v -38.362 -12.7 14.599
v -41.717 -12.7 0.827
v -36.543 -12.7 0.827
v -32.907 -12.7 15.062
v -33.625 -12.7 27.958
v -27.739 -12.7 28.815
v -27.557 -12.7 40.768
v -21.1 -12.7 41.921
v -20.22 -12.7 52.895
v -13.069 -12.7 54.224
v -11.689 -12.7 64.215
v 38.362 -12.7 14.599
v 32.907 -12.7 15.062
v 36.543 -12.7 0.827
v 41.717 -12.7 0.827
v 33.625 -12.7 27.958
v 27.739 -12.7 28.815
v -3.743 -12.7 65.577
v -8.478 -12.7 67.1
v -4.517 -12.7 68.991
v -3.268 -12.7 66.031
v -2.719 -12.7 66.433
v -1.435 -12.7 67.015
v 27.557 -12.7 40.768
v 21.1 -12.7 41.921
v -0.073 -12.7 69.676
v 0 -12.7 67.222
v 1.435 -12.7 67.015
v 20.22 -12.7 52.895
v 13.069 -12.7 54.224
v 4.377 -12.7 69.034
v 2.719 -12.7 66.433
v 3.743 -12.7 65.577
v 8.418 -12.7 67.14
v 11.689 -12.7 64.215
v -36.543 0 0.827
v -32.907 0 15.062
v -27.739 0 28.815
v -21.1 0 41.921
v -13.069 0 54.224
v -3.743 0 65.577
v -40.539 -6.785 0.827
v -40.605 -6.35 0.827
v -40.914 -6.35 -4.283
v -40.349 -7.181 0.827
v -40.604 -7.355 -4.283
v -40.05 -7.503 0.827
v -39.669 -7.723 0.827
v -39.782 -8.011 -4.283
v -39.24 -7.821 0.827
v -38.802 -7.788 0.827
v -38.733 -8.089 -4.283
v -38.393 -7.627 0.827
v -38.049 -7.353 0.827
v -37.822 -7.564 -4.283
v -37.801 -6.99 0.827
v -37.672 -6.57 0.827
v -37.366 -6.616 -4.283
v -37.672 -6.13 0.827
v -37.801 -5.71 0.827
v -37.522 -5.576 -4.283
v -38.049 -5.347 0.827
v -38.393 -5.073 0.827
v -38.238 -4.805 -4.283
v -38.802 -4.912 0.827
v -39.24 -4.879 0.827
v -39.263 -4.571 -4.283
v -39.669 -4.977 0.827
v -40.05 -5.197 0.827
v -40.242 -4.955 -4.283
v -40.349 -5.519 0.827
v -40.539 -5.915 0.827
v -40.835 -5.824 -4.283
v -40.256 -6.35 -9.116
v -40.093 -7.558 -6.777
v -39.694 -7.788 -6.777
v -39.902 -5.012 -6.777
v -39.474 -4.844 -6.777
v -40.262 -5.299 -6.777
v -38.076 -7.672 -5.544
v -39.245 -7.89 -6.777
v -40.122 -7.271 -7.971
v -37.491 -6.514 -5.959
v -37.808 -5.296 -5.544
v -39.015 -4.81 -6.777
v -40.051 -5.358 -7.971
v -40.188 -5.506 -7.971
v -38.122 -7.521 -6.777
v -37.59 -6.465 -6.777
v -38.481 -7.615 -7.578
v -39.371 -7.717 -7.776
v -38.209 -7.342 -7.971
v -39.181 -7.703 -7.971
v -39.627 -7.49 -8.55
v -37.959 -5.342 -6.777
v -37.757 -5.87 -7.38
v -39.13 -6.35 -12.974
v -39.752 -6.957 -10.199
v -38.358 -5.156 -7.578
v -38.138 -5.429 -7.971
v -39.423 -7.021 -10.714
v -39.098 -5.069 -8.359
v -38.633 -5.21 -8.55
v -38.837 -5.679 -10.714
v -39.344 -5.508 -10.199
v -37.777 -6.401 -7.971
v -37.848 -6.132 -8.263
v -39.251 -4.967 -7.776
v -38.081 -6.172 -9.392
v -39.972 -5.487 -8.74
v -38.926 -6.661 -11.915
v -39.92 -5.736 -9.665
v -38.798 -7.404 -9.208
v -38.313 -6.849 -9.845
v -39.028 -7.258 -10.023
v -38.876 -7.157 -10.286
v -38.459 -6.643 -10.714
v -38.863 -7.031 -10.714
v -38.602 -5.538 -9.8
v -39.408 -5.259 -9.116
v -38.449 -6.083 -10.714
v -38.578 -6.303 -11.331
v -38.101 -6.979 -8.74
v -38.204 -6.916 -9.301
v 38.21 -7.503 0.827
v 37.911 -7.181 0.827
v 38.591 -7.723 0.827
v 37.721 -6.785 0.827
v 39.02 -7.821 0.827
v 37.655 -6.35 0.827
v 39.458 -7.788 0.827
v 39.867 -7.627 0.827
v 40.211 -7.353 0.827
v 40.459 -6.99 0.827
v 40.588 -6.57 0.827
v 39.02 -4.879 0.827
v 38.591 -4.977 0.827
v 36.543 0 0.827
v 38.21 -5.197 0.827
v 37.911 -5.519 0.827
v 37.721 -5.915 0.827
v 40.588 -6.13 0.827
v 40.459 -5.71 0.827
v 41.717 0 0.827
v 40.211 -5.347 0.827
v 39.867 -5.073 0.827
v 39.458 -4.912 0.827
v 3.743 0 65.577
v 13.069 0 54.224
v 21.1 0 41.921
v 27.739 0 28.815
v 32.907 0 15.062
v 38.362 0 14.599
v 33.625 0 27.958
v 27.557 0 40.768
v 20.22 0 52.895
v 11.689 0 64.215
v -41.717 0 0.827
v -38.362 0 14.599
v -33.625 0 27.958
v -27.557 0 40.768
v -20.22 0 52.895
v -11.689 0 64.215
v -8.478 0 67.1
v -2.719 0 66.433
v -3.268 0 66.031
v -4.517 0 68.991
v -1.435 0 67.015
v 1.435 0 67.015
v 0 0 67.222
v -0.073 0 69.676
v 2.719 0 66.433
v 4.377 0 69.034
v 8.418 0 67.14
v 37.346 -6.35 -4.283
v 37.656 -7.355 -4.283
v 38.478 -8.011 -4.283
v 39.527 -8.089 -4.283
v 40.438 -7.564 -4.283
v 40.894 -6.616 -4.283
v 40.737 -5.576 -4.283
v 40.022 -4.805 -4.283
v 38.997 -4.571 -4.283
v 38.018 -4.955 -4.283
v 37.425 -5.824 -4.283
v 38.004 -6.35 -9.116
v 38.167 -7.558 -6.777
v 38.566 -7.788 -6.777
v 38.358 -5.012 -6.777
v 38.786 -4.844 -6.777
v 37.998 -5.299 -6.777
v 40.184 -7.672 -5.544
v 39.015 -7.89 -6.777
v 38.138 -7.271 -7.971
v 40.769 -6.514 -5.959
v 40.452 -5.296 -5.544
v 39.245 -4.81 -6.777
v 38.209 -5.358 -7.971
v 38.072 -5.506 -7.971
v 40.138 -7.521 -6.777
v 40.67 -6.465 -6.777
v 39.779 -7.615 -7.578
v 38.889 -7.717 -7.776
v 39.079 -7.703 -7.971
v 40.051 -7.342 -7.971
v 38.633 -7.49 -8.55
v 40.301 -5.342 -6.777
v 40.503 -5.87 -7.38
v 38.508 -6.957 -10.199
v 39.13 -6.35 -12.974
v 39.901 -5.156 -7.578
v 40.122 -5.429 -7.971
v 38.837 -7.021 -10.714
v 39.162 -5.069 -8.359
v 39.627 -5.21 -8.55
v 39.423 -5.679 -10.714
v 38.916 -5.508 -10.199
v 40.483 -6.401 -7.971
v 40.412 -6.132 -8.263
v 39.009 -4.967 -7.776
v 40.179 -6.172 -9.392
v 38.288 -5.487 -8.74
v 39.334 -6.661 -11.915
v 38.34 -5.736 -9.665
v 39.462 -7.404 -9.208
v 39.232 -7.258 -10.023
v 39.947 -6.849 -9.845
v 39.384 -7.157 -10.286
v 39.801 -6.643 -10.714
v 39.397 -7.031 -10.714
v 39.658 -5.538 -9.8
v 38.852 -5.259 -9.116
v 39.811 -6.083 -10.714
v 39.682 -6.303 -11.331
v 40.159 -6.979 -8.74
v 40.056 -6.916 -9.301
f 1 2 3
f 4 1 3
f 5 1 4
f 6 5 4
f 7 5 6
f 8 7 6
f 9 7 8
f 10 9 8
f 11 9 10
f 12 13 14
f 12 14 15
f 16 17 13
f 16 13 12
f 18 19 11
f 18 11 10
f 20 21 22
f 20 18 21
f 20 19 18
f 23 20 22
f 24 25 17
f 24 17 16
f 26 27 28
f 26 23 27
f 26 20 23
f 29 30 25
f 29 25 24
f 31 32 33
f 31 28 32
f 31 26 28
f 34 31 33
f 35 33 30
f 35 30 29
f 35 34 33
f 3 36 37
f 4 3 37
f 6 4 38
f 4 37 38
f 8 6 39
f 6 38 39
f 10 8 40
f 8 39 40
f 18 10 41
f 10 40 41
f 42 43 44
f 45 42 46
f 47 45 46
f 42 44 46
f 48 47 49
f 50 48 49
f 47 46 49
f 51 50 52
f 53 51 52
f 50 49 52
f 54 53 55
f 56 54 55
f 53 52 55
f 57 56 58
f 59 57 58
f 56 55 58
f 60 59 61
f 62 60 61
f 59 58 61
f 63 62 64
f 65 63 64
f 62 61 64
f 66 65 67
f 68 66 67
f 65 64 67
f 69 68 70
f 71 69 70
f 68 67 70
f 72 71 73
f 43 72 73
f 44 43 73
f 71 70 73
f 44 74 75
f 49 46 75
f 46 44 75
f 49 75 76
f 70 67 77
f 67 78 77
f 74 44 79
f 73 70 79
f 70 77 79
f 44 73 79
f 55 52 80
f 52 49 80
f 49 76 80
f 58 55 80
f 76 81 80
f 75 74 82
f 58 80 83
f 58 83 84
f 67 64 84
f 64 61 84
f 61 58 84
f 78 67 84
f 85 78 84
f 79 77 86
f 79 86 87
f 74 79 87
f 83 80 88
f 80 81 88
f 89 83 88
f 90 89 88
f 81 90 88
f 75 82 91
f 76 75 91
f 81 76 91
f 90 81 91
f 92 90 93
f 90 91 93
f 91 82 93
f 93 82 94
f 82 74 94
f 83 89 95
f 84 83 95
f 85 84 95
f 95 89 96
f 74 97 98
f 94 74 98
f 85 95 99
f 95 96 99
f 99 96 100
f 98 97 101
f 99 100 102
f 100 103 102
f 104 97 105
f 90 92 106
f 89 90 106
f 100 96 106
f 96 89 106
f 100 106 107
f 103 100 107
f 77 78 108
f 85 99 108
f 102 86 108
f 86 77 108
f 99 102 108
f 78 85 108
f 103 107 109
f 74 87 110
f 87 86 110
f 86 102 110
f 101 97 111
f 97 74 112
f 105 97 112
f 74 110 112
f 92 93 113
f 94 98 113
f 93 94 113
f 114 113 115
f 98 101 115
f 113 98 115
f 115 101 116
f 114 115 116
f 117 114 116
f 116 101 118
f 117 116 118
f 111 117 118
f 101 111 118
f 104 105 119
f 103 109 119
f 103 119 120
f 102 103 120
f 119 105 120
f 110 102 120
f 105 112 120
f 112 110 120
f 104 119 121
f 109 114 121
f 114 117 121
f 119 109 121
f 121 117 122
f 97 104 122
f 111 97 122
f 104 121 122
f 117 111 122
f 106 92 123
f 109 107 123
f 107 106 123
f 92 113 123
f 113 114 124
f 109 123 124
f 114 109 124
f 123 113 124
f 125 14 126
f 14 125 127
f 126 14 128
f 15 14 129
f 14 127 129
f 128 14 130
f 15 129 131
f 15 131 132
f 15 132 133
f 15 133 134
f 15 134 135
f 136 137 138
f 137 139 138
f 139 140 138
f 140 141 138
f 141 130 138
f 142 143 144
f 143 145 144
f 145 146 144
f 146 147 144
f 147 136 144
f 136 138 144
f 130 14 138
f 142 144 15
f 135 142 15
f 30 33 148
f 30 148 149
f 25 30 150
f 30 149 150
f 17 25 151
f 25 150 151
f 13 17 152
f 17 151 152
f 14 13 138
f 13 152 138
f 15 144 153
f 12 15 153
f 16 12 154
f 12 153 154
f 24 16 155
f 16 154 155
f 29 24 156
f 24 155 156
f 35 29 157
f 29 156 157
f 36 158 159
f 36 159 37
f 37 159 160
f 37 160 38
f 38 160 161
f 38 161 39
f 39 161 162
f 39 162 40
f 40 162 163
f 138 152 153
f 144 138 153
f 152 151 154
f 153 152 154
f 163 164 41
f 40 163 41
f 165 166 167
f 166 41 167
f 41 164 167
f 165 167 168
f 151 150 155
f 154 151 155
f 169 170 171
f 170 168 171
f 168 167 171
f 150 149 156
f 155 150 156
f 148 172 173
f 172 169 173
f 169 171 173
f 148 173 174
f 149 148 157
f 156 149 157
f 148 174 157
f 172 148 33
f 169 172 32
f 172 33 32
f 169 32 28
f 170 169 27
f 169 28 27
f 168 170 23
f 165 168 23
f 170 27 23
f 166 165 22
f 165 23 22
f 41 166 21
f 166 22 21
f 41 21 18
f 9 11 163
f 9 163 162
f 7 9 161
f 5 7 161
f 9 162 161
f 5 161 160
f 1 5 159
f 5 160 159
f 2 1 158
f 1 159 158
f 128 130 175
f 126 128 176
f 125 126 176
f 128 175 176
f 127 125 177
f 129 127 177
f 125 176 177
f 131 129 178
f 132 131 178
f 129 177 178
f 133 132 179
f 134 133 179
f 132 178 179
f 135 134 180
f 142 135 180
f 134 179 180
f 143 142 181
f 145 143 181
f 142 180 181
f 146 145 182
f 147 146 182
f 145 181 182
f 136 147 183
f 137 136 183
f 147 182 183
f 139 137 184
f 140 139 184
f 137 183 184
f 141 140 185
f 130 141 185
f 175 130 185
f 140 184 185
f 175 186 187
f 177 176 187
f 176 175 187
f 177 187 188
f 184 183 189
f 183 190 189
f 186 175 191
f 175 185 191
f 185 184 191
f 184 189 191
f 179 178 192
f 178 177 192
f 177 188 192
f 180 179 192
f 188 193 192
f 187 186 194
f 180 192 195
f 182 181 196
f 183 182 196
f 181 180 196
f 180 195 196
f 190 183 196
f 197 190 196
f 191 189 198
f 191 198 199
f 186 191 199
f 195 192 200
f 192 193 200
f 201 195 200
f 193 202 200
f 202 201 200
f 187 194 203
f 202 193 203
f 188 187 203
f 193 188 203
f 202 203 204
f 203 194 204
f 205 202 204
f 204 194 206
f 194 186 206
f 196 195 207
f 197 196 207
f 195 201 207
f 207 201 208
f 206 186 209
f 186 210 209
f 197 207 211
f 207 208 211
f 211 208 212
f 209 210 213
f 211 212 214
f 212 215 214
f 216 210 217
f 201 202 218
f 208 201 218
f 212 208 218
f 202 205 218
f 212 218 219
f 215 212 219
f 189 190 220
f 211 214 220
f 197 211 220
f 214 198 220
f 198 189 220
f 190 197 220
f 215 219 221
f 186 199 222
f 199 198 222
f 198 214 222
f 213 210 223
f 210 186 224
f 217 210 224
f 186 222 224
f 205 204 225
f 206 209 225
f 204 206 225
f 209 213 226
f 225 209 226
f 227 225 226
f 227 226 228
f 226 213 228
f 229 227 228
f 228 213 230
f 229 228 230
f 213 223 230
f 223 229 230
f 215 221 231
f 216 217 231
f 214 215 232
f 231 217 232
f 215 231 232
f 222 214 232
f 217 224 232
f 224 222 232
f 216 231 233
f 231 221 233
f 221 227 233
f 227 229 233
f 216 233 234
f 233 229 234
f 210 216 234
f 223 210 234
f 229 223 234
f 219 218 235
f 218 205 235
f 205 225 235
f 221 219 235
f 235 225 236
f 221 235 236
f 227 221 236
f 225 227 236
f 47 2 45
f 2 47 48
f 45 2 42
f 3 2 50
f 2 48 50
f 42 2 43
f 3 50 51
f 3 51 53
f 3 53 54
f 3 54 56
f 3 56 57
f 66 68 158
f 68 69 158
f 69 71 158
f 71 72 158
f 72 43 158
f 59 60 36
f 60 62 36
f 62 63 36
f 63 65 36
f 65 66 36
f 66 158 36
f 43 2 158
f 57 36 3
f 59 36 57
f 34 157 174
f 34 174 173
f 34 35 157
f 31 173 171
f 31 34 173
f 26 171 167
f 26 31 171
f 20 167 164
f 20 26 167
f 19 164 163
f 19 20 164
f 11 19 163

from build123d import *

# Parameters (mm, degrees)
F1_DEPTH = 12.7
F2_R     = 15.24
F3_R     = 5.08


with BuildPart() as f1:
    # F0 (on Front) → F1 (new body)
    with BuildSketch(Plane.XZ):
        with BuildLine():
            ThreePointArc((41.717369, 0.82729), (26.878905, 42.014486), (0, 76.570086))
            ThreePointArc((0, 76.570086), (-26.878905, 42.014486), (-41.717369, 0.82729))
            Line((-41.717369, 0.82729), (-36.542559, 0.82729))
            ThreePointArc((-36.542559, 0.82729), (-23.349687, 37.863578), (0, 69.494744))
            ThreePointArc((0, 69.494744), (23.349687, 37.863578), (36.542559, 0.82729))
            Line((36.542559, 0.82729), (41.717369, 0.82729))
        make_face()
    extrude(amount=F1_DEPTH)

    # F2
    f2_edges = [f1.edges().sort_by_distance(p)[0] for p in [
        (0, -6.35, 76.570086),
    ]]
    fillet(f2_edges, radius=F2_R)

    # F3
    f3_edges = [f1.edges().sort_by_distance(p)[0] for p in [
        (0, -6.35, 69.494744),
    ]]
    fillet(f3_edges, radius=F3_R)

    # F5 (on offset) → F6 (revolve)
    with BuildSketch(Plane.XZ.offset(6.35)):
        with BuildLine():
            Line((39.129964, 0.82729), (37.655077, 0.82729))
            add(Edge.make_bspline(
                [(37.655077, 0.82729), (36.695255, -4.188608), (37.93704, -9.83515), (39.129964, -12.974122)],
                knots=[0, 0, 0, 0, 13.879995, 13.879995, 13.879995, 13.879995], degree=3))
            Line((39.129964, -12.974122), (39.129964, 0.82729))
        make_face()
    revolve(axis=Axis((39.129964, -6.35, -6.073416), (0, 0, 1)))

    # F5 (on offset) → F7 (revolve)
    with BuildSketch(Plane.XZ.offset(6.35)):
        with BuildLine():
            Line((-39.129964, 0.82729), (-40.604852, 0.82729))
            add(Edge.make_bspline(
                [(-40.604852, 0.82729), (-41.564673, -4.188608), (-40.322889, -9.83515), (-39.129964, -12.974122)],
                knots=[0, 0, 0, 0, 13.879995, 13.879995, 13.879995, 13.879995], degree=3))
            Line((-39.129964, -12.974122), (-39.129964, 0.82729))
        make_face()
    revolve(axis=Axis((-39.129964, -6.35, -6.073416), (0, 0, 1)))


solid = f1.part
